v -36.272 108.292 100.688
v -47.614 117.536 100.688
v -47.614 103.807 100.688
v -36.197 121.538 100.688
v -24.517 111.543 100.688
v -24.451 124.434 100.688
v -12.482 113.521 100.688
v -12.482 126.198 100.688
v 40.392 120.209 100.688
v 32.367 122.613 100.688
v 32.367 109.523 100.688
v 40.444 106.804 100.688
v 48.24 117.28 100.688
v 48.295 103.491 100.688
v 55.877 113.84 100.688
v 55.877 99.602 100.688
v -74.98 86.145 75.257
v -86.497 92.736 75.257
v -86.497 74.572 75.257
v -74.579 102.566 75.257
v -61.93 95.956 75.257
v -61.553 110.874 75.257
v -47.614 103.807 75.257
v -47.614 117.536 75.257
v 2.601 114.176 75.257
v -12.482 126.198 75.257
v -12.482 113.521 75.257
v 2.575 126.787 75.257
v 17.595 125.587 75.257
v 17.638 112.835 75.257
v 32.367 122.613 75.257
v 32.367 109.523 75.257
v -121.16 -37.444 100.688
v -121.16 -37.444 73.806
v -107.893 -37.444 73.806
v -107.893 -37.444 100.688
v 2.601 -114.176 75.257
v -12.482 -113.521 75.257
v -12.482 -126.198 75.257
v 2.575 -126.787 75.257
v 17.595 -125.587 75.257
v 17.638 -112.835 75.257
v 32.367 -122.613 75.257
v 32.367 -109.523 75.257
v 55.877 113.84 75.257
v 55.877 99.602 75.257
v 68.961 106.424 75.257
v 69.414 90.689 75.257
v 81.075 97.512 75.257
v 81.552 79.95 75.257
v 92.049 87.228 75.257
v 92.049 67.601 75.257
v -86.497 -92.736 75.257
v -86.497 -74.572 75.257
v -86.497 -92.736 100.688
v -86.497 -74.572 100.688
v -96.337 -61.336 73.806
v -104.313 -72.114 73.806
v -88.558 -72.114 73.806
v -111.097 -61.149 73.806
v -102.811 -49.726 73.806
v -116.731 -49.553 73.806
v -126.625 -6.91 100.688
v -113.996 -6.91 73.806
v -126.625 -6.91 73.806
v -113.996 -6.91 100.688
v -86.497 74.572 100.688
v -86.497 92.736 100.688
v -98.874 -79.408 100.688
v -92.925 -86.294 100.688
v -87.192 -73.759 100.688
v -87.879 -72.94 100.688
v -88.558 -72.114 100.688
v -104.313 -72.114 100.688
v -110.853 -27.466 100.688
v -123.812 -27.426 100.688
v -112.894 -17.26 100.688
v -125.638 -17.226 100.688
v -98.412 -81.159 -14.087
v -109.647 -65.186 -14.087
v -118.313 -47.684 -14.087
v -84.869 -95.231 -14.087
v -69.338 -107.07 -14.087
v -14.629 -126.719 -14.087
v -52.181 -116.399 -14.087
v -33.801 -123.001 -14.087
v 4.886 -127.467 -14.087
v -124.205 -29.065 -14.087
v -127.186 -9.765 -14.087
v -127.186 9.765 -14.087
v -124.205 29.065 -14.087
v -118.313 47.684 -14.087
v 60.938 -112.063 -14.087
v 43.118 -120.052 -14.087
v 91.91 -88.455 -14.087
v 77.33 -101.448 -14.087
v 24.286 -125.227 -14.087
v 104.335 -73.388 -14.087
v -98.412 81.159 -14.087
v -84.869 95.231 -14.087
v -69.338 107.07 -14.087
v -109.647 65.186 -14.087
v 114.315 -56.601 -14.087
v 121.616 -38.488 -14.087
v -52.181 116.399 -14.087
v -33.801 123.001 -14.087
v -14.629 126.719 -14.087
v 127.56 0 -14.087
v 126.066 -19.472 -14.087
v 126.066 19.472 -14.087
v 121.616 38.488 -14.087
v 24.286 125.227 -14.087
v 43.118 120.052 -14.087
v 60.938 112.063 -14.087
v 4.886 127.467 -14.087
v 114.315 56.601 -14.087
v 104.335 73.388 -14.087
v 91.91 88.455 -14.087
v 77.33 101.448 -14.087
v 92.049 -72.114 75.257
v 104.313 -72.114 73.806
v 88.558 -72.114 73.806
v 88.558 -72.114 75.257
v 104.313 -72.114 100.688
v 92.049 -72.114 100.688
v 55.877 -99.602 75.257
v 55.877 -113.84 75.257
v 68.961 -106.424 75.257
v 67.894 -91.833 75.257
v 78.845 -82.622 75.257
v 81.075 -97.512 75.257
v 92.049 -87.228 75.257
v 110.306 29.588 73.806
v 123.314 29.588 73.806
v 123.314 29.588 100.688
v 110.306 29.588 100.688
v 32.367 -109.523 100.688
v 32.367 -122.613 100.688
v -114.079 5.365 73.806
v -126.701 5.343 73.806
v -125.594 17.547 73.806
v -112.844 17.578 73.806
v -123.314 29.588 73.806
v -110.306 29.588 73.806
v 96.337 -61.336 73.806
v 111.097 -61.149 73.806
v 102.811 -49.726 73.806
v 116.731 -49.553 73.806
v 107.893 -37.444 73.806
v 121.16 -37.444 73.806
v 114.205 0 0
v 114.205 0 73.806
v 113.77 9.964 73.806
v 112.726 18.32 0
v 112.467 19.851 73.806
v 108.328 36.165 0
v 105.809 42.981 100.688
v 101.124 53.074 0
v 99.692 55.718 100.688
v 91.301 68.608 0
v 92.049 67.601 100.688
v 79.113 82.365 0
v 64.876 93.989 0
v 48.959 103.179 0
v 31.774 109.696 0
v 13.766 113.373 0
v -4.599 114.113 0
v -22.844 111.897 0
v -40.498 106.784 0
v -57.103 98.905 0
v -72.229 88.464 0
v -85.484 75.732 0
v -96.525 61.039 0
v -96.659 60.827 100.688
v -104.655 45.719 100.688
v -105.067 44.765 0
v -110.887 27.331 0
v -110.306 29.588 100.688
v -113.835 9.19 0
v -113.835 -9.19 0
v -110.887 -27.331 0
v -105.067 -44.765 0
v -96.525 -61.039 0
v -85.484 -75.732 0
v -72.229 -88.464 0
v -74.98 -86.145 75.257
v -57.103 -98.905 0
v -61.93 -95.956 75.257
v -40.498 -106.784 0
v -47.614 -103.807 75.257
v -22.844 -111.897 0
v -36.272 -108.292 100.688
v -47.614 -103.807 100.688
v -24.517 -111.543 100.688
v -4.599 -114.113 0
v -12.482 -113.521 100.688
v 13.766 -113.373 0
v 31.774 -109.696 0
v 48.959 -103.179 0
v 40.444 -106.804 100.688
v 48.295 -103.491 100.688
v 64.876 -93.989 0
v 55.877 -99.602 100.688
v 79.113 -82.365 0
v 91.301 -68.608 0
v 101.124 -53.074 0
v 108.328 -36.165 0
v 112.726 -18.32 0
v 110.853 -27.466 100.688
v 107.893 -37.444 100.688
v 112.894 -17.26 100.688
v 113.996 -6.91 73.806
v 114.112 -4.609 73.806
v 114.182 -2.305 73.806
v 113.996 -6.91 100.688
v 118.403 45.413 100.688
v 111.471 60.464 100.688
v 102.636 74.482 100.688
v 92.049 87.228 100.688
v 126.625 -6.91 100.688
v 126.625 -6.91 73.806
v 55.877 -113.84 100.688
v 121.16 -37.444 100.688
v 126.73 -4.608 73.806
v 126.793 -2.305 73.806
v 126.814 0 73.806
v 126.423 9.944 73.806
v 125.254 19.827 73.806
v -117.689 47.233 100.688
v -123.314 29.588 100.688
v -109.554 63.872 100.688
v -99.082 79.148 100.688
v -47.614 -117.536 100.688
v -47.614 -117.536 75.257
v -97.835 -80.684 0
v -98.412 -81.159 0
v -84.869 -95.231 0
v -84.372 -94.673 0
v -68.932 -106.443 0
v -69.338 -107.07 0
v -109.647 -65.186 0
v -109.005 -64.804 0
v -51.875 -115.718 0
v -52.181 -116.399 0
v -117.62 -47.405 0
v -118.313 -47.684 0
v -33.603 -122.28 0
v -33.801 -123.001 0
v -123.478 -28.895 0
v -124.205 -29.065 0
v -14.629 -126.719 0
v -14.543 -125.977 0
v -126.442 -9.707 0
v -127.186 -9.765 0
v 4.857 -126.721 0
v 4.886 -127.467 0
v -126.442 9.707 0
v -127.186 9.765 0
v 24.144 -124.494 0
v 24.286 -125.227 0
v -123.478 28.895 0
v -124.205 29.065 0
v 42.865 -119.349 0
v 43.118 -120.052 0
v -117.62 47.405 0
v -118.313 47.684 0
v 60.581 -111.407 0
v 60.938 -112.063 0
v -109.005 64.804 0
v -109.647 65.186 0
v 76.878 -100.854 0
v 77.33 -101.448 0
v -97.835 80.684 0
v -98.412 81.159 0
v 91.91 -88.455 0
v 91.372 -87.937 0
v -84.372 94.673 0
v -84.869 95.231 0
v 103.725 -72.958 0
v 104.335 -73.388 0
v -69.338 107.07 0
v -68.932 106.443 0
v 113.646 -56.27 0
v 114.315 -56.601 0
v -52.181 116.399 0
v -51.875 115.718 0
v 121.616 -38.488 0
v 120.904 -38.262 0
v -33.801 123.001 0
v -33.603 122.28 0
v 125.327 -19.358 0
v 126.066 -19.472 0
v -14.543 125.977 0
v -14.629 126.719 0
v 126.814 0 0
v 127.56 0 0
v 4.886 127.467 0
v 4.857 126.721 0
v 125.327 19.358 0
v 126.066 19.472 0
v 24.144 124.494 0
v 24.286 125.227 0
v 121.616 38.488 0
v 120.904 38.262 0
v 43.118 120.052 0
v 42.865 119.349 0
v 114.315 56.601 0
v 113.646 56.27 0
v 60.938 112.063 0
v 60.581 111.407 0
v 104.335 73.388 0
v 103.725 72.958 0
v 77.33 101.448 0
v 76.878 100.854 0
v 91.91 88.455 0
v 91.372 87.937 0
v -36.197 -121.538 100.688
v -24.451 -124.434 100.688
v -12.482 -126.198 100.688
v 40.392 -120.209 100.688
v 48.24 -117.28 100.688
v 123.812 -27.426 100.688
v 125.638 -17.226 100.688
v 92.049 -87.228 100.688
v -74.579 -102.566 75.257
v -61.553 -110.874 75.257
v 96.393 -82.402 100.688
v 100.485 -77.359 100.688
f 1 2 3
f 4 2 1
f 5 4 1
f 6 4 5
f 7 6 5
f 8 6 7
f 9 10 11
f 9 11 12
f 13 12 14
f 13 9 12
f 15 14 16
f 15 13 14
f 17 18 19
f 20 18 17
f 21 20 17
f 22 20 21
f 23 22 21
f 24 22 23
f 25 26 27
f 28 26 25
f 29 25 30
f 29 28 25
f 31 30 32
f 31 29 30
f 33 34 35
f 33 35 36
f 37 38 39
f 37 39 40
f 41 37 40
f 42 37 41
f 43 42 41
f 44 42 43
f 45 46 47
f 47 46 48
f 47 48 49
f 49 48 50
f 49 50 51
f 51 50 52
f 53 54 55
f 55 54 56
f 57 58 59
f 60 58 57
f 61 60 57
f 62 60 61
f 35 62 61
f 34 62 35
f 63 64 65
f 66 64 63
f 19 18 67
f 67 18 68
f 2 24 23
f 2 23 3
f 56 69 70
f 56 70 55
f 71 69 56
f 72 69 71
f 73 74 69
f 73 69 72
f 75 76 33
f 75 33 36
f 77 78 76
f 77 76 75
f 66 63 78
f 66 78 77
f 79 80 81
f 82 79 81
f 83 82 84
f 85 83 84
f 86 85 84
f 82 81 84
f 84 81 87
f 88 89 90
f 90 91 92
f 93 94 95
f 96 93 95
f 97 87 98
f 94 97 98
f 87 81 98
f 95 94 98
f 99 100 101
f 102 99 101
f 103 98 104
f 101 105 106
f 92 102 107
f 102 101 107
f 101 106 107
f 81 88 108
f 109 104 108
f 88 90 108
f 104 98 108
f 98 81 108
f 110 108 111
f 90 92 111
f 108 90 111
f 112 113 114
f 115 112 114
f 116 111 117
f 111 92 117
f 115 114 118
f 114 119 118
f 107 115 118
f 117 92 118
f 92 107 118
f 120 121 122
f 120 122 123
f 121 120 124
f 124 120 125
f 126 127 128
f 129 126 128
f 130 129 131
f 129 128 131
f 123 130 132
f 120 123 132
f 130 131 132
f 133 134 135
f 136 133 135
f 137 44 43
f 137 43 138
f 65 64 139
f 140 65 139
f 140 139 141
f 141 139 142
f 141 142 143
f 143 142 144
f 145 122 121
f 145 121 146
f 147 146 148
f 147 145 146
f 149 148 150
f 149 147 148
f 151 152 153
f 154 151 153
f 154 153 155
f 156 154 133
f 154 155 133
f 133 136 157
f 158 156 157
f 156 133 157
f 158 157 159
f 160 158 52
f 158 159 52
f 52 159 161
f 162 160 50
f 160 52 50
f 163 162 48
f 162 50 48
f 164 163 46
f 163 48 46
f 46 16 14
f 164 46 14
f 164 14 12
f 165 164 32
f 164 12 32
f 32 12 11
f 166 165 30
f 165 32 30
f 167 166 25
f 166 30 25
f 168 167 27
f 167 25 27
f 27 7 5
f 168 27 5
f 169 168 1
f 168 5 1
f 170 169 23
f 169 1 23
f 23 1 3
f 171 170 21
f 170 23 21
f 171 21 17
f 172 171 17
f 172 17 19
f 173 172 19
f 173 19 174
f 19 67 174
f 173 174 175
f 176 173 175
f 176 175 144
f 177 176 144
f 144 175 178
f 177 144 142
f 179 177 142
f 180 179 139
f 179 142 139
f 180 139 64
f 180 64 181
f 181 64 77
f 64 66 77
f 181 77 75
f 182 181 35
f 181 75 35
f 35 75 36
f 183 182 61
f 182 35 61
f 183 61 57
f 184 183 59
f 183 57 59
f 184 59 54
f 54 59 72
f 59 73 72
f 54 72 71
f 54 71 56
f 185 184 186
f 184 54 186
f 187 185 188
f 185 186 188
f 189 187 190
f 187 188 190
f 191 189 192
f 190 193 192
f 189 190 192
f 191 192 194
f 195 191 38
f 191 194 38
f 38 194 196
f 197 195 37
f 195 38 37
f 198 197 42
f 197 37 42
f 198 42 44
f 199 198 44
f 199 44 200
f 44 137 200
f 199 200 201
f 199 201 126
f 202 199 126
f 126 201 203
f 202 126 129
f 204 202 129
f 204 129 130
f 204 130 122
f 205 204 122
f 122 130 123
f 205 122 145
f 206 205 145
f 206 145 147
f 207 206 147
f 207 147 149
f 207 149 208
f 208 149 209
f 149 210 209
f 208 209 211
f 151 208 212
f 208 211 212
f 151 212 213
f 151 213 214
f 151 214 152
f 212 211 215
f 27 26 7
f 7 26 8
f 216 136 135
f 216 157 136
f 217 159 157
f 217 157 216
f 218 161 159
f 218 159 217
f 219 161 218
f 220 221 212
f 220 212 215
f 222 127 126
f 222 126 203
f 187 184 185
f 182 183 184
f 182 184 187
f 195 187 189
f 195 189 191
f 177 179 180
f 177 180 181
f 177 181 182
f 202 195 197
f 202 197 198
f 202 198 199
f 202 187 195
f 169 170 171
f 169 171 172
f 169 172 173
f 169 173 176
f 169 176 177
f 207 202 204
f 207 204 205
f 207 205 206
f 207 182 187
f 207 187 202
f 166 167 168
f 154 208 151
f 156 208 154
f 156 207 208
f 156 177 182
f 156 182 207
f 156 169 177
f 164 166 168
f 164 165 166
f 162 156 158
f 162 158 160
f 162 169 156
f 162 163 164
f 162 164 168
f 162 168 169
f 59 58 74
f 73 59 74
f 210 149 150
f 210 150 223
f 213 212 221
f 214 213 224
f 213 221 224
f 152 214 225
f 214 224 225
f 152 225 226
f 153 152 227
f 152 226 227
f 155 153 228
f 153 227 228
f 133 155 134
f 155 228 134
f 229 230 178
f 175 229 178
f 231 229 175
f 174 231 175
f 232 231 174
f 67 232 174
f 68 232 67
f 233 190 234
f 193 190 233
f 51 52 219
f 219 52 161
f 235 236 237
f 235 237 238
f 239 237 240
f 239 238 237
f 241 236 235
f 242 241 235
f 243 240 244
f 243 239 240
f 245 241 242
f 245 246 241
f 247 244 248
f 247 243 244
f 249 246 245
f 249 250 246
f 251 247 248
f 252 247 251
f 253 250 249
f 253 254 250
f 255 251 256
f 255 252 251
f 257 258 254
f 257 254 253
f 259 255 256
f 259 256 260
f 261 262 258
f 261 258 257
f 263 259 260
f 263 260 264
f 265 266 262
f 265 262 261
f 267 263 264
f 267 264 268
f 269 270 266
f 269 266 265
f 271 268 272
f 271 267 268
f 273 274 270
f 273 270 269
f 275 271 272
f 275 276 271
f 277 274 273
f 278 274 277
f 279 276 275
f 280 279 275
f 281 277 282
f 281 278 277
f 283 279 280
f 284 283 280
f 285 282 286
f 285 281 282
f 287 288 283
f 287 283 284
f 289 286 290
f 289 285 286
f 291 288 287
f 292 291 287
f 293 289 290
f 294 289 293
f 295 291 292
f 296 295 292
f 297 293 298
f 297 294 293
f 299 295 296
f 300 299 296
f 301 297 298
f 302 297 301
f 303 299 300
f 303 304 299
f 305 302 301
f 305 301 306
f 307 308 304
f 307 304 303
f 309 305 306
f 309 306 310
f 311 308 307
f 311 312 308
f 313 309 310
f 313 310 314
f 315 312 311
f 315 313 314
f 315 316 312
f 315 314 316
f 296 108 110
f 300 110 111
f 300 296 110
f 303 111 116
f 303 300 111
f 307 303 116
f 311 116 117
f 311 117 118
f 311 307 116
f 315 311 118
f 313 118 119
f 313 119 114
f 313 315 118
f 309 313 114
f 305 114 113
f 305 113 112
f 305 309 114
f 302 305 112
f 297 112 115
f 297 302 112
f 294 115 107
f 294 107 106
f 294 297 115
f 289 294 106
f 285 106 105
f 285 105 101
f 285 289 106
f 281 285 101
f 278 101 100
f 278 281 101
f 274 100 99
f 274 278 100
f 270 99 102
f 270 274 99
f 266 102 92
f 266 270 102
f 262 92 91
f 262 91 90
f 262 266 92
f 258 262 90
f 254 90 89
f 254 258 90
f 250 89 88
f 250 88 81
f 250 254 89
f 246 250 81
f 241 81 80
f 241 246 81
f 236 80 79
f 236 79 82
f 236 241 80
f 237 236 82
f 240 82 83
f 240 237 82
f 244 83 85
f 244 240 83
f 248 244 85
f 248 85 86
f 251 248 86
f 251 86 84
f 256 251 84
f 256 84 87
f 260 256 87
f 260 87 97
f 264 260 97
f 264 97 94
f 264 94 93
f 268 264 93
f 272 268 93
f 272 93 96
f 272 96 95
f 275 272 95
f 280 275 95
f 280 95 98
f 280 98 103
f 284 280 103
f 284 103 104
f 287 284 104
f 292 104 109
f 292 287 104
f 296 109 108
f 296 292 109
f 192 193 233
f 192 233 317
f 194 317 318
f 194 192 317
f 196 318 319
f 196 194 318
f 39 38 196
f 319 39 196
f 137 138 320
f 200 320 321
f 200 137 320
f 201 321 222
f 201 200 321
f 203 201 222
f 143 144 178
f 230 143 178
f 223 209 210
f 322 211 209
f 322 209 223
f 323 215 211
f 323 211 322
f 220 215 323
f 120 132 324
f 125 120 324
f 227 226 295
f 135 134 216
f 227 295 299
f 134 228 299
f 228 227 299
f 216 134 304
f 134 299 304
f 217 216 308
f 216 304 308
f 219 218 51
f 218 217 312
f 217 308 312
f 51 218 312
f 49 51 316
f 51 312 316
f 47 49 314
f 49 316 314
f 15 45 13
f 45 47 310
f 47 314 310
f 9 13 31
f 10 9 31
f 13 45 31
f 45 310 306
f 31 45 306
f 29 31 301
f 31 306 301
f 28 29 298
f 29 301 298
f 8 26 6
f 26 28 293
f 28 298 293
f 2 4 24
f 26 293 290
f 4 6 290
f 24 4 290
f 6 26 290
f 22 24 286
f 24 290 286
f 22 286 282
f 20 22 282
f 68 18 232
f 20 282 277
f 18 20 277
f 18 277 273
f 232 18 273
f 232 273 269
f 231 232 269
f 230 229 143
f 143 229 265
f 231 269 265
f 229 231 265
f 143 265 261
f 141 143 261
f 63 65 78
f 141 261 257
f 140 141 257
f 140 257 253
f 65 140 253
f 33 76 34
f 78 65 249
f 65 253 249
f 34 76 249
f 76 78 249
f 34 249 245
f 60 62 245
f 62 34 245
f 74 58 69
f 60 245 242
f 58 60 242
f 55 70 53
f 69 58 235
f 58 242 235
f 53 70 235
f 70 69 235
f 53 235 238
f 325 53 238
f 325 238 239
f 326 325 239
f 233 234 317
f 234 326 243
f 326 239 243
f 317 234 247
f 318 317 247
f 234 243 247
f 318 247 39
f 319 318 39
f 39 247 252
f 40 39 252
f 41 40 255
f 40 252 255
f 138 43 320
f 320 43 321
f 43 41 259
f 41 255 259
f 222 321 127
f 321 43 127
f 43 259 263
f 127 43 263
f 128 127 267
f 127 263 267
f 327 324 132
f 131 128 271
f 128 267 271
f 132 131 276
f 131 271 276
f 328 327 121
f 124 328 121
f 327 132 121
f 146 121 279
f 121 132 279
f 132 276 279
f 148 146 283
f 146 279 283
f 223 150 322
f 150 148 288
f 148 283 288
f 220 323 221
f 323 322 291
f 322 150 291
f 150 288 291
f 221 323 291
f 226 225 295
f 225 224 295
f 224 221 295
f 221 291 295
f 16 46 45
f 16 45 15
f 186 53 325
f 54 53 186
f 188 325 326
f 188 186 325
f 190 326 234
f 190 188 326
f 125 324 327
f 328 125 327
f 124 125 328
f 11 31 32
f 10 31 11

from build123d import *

# Parameters (mm, degrees)
F0_R      = 126.81364
F1_DEPTH  = 100.688182
F2_R      = 114.205285
F3_DEPTH  = 132.476546
F4_W      = 18.965825
F4_H      = 17.48392
F5_DEPTH  = 25
F7_W      = 34.670085
F7_H      = 27.337872
F7_W_2    = 36.49801
F7_H_2    = 28.232135
F8_DEPTH  = 163.279541
F9_W      = 38.883805
F9_H      = 29.987096
F9_W_2    = 44.849336
F9_W_3    = 36.171764
F10_DEPTH = 212.745748
F11_R     = 127.560498
F12_DEPTH = 14.086724


with BuildPart() as f1:
    # F0 (on Top) → F1 (new body)
    with BuildSketch(Plane.XY):
        Circle(F0_R)
    extrude(amount=F1_DEPTH)

    # F2 (on face) → F3 (cut)
    with BuildSketch(Plane.XY.offset(100.688182)):
        Circle(F2_R)
    extrude(amount=-F3_DEPTH, mode=Mode.SUBTRACT)

    # F7 (on Right) → F8 (cut, symmetric)
    with BuildSketch(Plane.YZ):
        with Locations((-54.778769, 87.475028)):
            Rectangle(F7_W, F7_H)
        with Locations((11.338532, 87.922159)):
            Rectangle(F7_W_2, F7_H_2)
    extrude(amount=F8_DEPTH, both=True, mode=Mode.SUBTRACT)

    # F9 (on Front) → F10 (cut, symmetric)
    with BuildSketch(Plane.XZ):
        with Locations((-67.055523, 90.25082)):
            Rectangle(F9_W, F9_H)
        with Locations((9.9428, 90.25082)):
            Rectangle(F9_W_2, F9_H)
        with Locations((73.962882, 90.25082)):
            Rectangle(F9_W_3, F9_H)
    extrude(amount=F10_DEPTH, both=True, mode=Mode.SUBTRACT)

    # F11 (on face) → F12 (join)
    with BuildSketch(Plane.XY):
        Circle(F11_R)
    extrude(amount=-F12_DEPTH)


with BuildPart() as f5:
    # F4 (on Front) → F5 (new body)
    with BuildSketch(Plane.XZ):
        with Locations((-64.803489, 66.289768)):
            Rectangle(F4_W, F4_H)
    extrude(amount=F5_DEPTH)


solid = f1.part
